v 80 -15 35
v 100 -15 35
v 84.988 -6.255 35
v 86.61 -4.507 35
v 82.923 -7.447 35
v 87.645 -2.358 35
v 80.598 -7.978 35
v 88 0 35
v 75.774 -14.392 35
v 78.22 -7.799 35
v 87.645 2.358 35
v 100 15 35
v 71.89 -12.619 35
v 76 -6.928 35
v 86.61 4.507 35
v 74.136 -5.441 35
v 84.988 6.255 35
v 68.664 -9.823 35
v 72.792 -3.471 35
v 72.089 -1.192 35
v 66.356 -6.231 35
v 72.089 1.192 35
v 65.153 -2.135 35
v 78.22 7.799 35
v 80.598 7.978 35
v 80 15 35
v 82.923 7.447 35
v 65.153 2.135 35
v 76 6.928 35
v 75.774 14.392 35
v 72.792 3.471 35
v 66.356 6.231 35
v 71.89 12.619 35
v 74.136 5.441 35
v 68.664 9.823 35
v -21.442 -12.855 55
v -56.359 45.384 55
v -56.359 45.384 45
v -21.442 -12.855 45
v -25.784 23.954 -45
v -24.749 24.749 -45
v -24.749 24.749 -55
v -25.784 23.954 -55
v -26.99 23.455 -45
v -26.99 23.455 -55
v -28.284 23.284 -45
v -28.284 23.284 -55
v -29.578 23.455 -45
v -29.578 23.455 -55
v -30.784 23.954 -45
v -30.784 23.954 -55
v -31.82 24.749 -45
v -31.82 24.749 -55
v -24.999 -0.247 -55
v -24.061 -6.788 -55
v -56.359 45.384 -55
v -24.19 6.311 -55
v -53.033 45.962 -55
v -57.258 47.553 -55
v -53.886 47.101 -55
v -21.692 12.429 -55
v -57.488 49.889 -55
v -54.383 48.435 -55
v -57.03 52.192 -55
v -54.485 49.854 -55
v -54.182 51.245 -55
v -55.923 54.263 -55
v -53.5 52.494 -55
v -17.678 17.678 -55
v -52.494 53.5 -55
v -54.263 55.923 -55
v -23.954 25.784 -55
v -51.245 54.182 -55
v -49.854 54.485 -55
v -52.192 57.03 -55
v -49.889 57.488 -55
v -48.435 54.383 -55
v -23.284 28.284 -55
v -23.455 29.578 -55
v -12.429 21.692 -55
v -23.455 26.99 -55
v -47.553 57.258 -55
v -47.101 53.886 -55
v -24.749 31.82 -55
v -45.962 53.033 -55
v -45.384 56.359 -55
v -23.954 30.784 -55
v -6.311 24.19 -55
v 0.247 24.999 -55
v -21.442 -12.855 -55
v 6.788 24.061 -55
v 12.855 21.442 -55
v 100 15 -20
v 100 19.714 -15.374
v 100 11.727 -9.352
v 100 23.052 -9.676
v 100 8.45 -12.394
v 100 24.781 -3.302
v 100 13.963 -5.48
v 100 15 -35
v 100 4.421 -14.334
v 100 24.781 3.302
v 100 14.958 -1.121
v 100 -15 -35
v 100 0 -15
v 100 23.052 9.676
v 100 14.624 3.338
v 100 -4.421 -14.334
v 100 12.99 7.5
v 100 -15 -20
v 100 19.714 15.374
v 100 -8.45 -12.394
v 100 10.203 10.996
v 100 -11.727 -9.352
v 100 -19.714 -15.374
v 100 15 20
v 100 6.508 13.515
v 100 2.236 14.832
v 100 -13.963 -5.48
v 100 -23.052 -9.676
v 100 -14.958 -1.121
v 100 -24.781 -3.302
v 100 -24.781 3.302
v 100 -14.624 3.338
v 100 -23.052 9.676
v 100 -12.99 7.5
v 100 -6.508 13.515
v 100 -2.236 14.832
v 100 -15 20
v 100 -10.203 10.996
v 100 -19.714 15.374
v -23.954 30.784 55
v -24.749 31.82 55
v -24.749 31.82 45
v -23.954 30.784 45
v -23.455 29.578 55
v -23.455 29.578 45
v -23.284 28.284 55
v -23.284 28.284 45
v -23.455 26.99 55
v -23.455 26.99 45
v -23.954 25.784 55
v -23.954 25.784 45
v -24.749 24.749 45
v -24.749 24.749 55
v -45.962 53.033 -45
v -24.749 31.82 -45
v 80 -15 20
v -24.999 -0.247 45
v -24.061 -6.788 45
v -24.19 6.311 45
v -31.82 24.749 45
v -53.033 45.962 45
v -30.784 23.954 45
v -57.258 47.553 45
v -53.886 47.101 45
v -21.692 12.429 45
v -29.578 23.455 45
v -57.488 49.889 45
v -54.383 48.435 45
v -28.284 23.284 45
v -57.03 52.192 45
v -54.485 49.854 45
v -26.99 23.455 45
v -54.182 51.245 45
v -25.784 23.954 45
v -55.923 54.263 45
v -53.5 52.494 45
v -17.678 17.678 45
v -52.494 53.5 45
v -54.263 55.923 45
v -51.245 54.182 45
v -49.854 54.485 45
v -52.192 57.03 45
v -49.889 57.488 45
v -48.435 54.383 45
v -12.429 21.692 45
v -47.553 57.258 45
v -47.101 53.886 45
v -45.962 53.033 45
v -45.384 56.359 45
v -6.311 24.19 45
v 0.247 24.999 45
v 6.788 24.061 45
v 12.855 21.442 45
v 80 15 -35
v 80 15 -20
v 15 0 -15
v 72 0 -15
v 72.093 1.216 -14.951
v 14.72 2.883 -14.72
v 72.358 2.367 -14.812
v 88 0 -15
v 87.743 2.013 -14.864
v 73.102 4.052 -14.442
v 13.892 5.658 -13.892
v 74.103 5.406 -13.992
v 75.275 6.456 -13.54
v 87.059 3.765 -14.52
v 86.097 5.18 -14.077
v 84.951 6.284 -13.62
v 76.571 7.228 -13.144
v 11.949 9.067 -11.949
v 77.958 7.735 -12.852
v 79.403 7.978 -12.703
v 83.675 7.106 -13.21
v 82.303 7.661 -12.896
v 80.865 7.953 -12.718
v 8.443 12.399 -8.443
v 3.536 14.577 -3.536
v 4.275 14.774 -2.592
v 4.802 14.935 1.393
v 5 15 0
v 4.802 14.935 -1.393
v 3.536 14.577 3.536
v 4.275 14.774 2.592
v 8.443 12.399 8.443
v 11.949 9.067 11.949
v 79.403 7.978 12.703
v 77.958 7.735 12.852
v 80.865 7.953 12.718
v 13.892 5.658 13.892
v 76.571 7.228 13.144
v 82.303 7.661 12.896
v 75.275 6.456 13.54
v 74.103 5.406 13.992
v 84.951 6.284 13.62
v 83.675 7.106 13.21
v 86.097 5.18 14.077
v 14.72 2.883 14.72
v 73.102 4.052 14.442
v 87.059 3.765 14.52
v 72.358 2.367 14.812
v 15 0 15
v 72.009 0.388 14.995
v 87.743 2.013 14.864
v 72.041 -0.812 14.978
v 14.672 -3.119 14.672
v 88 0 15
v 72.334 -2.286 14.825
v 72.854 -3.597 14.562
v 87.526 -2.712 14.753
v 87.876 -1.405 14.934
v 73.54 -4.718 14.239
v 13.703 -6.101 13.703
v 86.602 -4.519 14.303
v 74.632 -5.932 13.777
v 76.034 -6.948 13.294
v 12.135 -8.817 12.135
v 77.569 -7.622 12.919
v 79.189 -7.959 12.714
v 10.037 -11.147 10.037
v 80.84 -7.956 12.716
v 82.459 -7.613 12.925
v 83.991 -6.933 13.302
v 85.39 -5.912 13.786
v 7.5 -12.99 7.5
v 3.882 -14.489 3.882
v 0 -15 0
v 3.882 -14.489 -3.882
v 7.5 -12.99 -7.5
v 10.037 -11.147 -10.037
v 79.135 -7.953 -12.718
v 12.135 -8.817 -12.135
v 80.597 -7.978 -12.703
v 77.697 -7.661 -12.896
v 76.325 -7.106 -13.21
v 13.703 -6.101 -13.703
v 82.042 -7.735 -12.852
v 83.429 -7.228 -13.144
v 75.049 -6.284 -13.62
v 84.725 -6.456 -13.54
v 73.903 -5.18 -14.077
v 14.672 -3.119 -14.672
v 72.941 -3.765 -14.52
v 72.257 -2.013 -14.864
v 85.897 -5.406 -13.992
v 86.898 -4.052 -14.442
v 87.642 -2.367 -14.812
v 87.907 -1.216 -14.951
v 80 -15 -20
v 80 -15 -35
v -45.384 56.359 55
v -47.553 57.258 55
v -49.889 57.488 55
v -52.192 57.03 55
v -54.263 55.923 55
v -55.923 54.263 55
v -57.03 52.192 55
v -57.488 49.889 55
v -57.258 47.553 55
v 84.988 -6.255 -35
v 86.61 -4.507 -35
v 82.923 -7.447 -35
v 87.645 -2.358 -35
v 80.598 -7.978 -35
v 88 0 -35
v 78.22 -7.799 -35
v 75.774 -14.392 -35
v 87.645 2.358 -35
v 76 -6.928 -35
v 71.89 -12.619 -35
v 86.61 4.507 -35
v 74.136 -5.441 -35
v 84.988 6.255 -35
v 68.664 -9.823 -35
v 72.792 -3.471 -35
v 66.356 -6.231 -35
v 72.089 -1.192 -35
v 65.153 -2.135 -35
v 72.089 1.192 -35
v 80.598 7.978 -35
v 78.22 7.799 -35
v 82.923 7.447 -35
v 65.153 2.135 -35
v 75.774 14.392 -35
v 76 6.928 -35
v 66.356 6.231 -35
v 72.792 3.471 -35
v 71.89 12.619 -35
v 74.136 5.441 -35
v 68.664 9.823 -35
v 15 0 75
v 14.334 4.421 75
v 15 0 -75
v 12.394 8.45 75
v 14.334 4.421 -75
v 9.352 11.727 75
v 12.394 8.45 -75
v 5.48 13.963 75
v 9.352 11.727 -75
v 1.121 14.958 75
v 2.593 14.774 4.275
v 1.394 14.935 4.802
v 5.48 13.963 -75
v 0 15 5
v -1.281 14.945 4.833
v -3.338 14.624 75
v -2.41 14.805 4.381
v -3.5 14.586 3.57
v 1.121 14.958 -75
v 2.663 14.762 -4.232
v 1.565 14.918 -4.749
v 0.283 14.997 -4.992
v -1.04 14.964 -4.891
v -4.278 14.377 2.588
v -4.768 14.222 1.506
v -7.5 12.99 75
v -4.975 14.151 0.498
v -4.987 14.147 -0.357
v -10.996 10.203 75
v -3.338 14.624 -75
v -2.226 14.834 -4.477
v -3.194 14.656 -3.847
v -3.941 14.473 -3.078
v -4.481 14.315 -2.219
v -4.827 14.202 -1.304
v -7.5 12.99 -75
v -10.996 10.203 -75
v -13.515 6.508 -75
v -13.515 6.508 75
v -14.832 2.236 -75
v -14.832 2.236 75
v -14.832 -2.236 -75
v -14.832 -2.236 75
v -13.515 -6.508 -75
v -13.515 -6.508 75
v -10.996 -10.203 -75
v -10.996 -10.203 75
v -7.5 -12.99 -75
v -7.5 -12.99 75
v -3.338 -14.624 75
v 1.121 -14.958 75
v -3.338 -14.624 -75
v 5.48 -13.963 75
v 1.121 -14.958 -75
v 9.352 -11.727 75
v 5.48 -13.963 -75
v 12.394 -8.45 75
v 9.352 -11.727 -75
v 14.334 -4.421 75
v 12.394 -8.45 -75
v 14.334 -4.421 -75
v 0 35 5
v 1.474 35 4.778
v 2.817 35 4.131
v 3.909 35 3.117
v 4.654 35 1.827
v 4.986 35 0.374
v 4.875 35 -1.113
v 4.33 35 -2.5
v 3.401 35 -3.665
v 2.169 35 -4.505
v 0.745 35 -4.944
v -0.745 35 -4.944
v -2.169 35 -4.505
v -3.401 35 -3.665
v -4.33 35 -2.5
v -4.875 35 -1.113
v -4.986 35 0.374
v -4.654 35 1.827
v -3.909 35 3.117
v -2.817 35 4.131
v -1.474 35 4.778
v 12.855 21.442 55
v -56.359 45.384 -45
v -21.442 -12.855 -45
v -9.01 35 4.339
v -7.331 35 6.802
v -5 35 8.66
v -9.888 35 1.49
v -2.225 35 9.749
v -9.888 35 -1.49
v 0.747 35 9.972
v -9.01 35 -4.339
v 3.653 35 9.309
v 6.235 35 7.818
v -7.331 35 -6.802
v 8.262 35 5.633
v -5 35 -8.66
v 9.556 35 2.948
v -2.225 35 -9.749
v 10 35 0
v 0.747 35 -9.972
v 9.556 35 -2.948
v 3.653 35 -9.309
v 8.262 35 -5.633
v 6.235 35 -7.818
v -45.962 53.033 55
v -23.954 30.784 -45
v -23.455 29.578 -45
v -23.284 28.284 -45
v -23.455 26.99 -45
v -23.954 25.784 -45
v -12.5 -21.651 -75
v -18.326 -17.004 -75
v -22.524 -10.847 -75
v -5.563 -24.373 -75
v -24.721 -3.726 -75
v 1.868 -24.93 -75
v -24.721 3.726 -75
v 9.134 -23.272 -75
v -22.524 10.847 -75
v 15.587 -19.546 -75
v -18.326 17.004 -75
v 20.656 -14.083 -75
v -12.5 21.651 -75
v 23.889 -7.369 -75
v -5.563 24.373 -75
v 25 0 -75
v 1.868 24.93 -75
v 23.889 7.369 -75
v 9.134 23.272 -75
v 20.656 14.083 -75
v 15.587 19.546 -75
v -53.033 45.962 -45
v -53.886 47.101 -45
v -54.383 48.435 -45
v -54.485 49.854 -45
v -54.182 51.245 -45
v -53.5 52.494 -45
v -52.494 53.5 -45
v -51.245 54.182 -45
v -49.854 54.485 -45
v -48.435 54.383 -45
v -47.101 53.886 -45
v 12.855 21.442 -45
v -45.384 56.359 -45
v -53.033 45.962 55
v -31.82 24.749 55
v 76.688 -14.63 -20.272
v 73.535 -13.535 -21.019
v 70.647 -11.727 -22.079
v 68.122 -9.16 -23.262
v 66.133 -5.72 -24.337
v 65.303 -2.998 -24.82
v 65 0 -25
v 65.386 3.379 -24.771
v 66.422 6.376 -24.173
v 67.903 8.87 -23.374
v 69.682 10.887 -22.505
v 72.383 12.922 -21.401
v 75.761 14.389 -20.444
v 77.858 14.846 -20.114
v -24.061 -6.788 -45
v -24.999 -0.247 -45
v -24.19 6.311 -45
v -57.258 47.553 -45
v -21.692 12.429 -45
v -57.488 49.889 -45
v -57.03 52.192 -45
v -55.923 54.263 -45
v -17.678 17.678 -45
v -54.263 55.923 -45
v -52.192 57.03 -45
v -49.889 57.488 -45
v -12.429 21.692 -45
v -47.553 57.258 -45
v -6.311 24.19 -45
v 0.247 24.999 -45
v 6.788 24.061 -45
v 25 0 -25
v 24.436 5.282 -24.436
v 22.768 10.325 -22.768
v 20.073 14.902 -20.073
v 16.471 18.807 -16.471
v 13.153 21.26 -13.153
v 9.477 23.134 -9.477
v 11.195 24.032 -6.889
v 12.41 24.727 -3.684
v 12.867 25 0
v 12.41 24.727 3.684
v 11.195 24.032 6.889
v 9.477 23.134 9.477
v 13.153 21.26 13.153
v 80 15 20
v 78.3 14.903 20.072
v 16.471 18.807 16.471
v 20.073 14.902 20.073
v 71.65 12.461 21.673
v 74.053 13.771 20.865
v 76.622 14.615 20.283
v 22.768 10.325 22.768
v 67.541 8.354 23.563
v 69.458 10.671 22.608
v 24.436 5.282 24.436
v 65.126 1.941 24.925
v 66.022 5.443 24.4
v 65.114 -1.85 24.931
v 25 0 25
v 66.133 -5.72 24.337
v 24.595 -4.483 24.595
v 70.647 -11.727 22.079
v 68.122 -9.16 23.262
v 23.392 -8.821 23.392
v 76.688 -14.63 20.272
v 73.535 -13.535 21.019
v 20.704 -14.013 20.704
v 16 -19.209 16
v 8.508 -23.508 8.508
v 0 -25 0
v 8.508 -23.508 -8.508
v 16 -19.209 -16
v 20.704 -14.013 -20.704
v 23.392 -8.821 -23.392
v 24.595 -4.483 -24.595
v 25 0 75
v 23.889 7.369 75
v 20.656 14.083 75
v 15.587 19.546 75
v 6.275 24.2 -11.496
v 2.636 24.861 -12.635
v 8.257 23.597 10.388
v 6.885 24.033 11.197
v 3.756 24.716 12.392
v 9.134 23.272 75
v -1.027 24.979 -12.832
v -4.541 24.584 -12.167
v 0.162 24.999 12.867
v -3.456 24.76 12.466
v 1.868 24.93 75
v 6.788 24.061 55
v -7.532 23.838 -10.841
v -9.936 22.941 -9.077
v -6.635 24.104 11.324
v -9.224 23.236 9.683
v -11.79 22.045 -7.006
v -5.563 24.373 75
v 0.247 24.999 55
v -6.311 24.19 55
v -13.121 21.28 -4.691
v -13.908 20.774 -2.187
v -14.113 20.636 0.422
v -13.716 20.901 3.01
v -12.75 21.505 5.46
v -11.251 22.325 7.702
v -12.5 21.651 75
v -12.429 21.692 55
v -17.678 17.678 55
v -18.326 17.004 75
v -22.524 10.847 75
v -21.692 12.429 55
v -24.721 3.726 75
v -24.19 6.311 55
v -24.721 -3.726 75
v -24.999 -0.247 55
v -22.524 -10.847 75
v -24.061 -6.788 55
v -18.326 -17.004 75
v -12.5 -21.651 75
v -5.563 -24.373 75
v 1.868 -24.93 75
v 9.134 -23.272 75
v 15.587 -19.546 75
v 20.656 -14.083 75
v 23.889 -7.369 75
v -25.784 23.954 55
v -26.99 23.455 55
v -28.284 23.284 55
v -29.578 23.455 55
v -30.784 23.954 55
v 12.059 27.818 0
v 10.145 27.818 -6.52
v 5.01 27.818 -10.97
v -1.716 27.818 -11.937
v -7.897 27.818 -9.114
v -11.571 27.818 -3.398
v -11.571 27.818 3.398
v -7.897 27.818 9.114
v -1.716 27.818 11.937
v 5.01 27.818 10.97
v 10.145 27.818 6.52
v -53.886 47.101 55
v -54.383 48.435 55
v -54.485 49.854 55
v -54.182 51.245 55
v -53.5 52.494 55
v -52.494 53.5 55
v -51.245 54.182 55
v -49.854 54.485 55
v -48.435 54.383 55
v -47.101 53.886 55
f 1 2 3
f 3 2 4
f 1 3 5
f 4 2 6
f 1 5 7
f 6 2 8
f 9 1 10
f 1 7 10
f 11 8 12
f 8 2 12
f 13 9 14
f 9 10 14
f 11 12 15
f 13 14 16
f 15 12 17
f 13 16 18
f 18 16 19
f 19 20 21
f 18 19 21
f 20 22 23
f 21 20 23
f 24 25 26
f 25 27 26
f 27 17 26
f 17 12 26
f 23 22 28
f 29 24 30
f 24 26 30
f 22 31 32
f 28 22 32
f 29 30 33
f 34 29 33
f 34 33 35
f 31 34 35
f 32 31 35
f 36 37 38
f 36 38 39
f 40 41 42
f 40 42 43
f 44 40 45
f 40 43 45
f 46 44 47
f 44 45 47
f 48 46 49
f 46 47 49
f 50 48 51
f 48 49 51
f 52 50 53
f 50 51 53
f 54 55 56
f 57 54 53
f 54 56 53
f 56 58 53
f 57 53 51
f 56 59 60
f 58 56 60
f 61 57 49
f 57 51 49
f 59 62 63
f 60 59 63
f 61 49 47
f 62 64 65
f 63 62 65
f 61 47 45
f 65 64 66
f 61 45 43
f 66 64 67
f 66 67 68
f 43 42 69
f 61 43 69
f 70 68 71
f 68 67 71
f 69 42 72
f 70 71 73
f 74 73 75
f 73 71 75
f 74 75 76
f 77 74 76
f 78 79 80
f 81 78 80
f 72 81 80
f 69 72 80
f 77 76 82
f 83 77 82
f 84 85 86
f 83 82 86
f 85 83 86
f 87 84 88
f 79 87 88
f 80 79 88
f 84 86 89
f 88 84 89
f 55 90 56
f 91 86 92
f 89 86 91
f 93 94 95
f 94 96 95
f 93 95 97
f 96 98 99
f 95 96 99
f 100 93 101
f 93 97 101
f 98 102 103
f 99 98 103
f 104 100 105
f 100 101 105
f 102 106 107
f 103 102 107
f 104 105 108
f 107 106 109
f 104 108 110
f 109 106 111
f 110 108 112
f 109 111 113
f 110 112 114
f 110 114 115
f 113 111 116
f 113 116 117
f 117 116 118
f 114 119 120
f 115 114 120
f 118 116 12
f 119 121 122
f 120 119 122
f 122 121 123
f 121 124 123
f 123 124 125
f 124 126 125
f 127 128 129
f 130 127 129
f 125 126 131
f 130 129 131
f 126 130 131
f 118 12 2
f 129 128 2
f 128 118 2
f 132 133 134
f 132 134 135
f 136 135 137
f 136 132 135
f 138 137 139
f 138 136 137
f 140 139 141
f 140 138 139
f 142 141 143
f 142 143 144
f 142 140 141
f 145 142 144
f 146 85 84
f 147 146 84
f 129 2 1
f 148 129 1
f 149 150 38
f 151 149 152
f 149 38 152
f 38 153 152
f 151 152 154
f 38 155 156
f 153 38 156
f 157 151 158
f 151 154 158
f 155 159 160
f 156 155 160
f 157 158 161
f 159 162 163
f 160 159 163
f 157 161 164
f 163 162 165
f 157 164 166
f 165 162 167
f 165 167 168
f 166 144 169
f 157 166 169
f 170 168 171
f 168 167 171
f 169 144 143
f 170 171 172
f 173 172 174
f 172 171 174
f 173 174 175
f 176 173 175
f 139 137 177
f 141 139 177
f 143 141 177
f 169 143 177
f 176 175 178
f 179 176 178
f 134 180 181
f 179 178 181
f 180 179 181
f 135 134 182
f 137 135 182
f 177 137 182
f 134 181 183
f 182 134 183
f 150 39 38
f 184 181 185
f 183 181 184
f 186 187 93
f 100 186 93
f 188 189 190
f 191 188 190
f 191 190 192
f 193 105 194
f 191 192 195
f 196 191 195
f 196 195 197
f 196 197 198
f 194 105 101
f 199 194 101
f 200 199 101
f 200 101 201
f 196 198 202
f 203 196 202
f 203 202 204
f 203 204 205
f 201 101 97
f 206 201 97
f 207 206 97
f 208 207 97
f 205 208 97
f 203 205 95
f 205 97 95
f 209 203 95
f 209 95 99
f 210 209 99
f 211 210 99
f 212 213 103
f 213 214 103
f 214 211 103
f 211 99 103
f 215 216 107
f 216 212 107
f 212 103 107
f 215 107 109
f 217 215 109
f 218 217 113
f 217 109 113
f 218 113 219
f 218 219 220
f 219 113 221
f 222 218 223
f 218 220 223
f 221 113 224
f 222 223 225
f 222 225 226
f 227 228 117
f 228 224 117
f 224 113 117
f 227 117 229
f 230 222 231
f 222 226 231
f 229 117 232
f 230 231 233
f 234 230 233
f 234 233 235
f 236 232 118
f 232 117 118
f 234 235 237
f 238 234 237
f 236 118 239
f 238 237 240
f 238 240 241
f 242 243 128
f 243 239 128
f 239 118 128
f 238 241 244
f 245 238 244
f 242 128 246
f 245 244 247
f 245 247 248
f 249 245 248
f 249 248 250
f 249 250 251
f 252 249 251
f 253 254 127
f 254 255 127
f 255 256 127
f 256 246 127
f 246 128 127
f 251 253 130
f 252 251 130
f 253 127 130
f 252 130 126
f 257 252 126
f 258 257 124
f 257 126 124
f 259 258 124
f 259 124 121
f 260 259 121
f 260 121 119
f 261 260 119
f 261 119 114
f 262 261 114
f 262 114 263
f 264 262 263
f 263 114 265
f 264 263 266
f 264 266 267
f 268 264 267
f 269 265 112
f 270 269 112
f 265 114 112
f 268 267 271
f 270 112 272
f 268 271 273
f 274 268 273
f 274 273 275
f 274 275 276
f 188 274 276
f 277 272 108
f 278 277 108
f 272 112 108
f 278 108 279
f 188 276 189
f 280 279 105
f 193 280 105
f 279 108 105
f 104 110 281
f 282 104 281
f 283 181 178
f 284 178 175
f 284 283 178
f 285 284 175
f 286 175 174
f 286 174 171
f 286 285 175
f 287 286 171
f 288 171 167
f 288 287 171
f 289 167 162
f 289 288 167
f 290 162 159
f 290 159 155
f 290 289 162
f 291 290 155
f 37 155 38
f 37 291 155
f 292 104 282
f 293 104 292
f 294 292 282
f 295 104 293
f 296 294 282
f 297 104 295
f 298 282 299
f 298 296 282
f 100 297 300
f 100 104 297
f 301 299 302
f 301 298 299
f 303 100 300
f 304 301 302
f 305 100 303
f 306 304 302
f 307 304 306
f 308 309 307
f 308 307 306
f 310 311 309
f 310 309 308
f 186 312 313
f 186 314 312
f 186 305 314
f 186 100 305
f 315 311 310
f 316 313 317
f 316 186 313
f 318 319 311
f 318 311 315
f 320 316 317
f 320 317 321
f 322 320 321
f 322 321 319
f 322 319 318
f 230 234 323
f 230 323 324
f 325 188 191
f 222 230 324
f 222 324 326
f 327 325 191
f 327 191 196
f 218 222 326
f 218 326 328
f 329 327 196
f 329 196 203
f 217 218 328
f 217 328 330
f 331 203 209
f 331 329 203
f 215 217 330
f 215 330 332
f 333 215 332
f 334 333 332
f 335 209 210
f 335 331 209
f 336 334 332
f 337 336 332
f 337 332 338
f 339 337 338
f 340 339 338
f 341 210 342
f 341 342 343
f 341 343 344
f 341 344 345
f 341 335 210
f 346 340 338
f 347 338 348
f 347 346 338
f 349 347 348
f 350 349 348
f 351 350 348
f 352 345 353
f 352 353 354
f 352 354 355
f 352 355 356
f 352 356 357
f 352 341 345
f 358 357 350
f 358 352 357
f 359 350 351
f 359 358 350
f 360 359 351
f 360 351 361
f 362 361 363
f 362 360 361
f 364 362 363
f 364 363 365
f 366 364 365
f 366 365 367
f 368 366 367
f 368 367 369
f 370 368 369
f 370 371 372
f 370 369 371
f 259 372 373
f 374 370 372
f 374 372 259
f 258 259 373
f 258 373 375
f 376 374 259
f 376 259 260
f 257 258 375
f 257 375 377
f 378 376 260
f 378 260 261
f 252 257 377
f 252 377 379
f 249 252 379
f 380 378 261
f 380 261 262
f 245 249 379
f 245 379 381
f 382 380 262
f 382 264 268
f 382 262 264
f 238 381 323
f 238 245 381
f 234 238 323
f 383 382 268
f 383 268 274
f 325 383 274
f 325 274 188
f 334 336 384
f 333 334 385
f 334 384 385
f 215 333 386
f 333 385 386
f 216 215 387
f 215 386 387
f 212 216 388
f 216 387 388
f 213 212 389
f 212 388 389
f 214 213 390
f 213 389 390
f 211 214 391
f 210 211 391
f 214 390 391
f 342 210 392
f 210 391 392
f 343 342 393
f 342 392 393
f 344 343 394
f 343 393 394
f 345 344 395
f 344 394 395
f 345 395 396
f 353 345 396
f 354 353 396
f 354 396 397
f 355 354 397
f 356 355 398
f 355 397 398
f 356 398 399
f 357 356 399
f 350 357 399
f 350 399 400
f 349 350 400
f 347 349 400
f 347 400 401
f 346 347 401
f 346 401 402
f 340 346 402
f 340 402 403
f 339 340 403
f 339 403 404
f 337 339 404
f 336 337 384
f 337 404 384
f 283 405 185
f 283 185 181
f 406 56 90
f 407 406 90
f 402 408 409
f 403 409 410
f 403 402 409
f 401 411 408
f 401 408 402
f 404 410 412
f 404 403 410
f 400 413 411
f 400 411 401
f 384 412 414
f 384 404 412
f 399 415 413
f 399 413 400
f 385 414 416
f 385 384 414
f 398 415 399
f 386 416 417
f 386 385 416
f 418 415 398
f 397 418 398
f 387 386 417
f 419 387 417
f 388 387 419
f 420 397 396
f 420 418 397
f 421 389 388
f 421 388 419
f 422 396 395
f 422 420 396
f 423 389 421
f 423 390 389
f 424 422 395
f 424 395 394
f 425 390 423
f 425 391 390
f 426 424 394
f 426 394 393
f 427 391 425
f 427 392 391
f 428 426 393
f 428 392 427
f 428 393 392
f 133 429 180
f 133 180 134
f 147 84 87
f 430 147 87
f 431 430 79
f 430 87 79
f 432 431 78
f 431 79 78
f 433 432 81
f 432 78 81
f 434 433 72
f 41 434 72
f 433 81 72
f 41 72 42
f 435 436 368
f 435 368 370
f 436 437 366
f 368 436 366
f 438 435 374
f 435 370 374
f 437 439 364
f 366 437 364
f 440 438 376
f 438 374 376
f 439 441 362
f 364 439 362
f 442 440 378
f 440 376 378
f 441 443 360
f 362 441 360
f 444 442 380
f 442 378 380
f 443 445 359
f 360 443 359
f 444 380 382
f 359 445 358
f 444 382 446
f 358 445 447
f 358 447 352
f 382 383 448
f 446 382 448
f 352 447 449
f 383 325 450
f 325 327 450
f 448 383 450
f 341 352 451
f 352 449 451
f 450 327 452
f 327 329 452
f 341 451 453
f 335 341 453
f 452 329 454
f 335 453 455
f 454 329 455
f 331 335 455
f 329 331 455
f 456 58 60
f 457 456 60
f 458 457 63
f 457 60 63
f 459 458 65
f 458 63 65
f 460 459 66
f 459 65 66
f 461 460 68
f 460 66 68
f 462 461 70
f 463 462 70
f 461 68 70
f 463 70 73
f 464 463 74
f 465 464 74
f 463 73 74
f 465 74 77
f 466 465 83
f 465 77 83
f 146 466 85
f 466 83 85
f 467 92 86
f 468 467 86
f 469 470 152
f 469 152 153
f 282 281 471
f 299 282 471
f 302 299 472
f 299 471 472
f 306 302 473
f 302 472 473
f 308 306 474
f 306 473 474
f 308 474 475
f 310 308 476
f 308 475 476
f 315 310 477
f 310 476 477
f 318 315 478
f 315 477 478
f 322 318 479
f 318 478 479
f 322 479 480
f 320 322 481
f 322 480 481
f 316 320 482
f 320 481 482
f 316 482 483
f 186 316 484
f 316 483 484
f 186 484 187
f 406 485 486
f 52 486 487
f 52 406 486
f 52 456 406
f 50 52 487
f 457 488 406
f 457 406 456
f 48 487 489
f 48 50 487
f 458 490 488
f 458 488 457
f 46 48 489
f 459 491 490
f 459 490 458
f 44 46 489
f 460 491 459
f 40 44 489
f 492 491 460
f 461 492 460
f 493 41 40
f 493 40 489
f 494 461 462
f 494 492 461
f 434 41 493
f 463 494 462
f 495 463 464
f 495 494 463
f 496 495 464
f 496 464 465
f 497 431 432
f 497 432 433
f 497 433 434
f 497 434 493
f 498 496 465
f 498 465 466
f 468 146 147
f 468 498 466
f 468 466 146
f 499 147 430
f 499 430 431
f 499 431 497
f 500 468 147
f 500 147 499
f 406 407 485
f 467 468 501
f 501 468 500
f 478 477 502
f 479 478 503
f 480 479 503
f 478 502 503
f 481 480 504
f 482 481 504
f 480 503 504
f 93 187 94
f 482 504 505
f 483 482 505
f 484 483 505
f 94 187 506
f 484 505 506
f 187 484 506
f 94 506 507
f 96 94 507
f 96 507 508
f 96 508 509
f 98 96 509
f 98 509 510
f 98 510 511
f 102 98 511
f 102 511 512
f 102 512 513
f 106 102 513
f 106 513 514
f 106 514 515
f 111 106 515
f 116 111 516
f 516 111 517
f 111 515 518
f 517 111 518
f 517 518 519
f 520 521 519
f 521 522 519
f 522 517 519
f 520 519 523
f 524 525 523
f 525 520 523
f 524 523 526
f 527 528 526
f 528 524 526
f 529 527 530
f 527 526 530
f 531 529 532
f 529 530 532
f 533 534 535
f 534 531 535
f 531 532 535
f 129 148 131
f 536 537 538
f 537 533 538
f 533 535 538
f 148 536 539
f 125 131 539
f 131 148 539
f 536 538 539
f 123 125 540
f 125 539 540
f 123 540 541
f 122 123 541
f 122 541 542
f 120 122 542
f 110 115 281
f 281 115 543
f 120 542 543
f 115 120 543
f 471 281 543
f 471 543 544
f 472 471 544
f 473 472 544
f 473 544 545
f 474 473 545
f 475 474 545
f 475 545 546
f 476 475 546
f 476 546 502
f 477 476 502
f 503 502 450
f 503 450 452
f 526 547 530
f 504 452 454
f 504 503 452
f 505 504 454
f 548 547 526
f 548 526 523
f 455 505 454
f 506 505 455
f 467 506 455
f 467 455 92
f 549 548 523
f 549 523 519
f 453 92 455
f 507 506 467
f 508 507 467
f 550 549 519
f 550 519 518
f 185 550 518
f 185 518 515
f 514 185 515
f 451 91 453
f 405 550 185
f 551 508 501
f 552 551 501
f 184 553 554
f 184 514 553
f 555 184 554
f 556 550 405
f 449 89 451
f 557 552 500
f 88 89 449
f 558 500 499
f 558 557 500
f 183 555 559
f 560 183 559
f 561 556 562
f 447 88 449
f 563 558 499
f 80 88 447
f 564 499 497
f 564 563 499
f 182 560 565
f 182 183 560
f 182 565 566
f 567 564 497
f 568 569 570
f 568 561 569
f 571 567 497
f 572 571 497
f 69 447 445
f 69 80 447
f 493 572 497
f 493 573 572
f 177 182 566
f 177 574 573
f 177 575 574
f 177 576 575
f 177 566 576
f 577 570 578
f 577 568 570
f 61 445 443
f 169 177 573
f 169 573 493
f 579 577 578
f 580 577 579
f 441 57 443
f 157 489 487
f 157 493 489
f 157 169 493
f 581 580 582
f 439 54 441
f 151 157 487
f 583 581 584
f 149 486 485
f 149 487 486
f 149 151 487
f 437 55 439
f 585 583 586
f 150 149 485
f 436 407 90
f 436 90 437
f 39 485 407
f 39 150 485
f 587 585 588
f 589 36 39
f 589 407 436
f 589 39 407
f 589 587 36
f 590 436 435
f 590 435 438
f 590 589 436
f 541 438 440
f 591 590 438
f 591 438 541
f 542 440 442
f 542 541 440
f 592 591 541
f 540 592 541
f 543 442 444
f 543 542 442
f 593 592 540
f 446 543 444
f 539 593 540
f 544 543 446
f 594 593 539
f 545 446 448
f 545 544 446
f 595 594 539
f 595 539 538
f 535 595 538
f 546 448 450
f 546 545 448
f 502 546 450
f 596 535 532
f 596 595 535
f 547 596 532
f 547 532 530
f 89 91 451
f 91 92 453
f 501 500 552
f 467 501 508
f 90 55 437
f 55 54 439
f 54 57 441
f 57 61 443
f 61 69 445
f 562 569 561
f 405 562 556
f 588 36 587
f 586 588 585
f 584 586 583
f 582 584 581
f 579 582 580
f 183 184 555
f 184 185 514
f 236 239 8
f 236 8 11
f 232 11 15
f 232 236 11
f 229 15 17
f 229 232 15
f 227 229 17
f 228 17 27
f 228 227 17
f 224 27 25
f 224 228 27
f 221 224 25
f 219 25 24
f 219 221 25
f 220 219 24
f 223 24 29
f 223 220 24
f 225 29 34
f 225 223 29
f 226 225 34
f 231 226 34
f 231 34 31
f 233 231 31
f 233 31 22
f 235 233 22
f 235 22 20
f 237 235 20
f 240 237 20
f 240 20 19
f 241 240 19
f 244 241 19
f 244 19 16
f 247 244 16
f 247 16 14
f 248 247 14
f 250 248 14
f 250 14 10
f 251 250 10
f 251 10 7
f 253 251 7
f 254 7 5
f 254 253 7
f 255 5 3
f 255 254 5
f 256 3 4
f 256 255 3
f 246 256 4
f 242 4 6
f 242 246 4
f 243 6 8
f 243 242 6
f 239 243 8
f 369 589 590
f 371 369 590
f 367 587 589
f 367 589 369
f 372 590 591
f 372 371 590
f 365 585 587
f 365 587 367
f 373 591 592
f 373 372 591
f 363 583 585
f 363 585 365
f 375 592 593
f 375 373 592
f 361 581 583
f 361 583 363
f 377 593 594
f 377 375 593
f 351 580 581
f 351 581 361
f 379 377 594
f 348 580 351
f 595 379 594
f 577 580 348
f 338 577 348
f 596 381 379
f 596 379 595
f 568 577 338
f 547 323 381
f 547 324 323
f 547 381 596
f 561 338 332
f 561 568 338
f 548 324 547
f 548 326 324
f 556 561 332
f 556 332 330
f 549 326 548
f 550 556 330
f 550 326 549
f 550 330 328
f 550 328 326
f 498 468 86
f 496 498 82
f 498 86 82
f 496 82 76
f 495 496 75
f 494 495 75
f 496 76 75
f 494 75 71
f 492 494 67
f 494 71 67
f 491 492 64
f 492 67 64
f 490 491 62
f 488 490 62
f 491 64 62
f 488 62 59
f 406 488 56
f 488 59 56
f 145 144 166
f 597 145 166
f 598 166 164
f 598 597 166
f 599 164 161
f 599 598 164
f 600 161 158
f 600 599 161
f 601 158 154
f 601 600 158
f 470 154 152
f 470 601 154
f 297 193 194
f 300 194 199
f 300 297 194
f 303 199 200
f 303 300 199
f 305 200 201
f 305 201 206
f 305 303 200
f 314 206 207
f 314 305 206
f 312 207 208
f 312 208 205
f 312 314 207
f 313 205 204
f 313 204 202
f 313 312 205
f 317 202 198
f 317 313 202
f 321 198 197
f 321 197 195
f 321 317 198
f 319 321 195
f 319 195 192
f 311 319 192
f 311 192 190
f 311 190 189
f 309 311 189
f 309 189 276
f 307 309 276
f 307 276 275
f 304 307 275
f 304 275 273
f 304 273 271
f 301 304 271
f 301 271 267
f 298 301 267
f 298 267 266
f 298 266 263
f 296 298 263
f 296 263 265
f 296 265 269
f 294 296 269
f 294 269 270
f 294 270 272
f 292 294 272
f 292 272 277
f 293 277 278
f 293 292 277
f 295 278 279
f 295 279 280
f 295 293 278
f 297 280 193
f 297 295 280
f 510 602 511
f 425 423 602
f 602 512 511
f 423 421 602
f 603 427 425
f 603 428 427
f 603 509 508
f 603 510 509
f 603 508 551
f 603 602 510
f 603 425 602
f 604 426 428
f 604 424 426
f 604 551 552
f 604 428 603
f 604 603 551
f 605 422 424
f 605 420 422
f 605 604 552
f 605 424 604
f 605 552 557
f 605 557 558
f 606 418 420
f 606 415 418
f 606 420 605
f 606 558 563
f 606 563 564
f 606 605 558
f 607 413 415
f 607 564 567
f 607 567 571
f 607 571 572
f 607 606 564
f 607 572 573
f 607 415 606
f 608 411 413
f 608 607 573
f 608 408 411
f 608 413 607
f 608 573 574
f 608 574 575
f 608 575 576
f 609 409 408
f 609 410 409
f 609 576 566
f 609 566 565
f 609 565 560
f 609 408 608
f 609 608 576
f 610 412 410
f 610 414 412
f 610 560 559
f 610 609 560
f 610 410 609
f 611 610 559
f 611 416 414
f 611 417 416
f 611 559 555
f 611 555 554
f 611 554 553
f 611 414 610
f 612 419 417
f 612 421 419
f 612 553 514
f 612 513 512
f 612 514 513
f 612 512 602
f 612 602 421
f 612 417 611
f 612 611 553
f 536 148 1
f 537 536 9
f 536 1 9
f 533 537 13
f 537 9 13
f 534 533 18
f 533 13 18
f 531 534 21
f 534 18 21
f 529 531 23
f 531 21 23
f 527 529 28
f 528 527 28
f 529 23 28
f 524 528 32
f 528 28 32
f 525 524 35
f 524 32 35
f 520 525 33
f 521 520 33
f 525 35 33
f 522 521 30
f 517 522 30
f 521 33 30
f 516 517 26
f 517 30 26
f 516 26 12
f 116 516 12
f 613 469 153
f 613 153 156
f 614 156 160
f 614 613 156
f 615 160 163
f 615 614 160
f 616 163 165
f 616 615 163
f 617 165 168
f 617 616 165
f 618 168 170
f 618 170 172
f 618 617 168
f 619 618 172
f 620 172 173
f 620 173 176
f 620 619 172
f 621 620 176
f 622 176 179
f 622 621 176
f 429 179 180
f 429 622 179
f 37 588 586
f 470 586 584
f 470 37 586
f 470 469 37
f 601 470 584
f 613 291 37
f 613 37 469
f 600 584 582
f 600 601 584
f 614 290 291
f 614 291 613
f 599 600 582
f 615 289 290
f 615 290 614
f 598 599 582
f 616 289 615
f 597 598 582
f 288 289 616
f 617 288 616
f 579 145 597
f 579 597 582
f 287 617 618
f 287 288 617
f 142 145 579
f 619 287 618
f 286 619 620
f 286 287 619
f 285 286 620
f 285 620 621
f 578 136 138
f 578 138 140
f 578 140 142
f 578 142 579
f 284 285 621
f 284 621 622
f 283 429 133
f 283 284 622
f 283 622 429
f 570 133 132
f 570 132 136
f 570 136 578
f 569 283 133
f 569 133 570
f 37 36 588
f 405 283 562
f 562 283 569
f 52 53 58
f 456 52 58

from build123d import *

# Parameters (mm, degrees)
SKETCH1_R               = 25
BOSS_EXTRUDE1_DEPTH     = 75
BOSS_EXTRUDE2_START     = 35
SKETCH3_R               = 10
BOSS_EXTRUDE2_DEPTH     = 35
BOSS_EXTRUDE2_DRAFT     = 16
SKETCH4_R               = 25
BOSS_EXTRUDE3_DEPTH     = 100
BOSS_EXTRUDE4_DEPTH     = 35
BOSS_EXTRUDE5_START     = 10
BOSS_EXTRUDE5_DEPTH     = 10
CUT_EXTRUDE2_DEPTH      = 190.22462748
CUT_EXTRUDE2_DEPTH_BACK = 190.22462748
SKETCH2_R               = 15
SKETCH7_R               = 15
CUT_EXTRUDE3_DEPTH      = 100
CUT_EXTRUDE4_DEPTH      = 160.392470452
CUT_EXTRUDE4_DEPTH_BACK = 160.392470452
SKETCH8_R               = 8
SKETCH9_R               = 5
CUT_EXTRUDE5_DEPTH      = 30


with BuildPart() as part:
    # Sketch1 → Boss-Extrude1 (new, symmetric)
    with BuildSketch(Plane.XY):
        Circle(SKETCH1_R)
    extrude(amount=BOSS_EXTRUDE1_DEPTH, both=True)


with BuildPart() as boss_extrude2_tool:
    # Sketch3 → Boss-Extrude2 (with draft: the straight prism first)
    with BuildSketch(Plane(origin=(0, 0, 0), x_dir=(1, 0, 0), z_dir=(0, 1, 0)).offset(BOSS_EXTRUDE2_START)):
        Circle(SKETCH3_R)
    extrude(amount=-BOSS_EXTRUDE2_DEPTH)
    # Boss-Extrude2: the draft: its side faces are tilted about the plane it starts from
    boss_extrude2_sides = [boss_extrude2_tool.faces().sort_by_distance(p)[0] for p in [
        (-10, 17.5, 0),
    ]]
    draft(boss_extrude2_sides, Plane(origin=(0, 0, 0), x_dir=(1, 0, 0), z_dir=(0, 1, 0)).offset(BOSS_EXTRUDE2_START), BOSS_EXTRUDE2_DRAFT)


with BuildPart() as part_1:
    add(part.part)

    # Boss-Extrude2: add boss_extrude2_tool
    add(boss_extrude2_tool.part)

    # Sketch4 → Boss-Extrude3 (add)
    with BuildSketch(Plane(origin=(0, 0, 0), x_dir=(0, 0, -1), z_dir=(1, 0, 0))):
        Circle(SKETCH4_R)
    extrude(amount=BOSS_EXTRUDE3_DEPTH)

    # Sketch5 → Boss-Extrude4 (add, symmetric)
    with BuildSketch(Plane.XY):
        with BuildLine():
            Line((80, 15), (100, 15))
            Line((100, 15), (100, -15))
            Line((100, -15), (80, -15))
            ThreePointArc((80, -15), (65, 0), (80, 15))
        make_face()
    extrude(amount=BOSS_EXTRUDE4_DEPTH, both=True)

    # Sketch6 → Boss-Extrude5 (add)
    with BuildSketch(Plane.XY.offset(45).offset(BOSS_EXTRUDE5_START)):
        with BuildLine():
            ThreePointArc((-45.383782434, 56.358781853), (-55.154328933, 55.154328933), (-56.358781853, 45.383782434))
            Line((-56.358781853, 45.383782434), (-21.441584906, -12.855288278))
            ThreePointArc((-21.441584906, -12.855288278), (-24.812182391, 3.058693344), (-17.67766953, 17.67766953))
            ThreePointArc((-17.67766953, 17.67766953), (-3.058693344, 24.812182391), (12.855288278, 21.441584906))
            Line((12.855288278, 21.441584906), (-45.383782434, 56.358781853))
        make_face()
        with BuildLine():
            ThreePointArc((-24.748737342, 31.819805153), (-23.284271247, 28.284271247), (-24.748737342, 24.748737342))
            ThreePointArc((-24.748737342, 24.748737342), (-28.284271247, 23.284271247), (-31.819805153, 24.748737342))
            Line((-31.819805153, 24.748737342), (-53.033008589, 45.961940777))
            ThreePointArc((-53.033008589, 45.961940777), (-53.033008589, 53.033008589), (-45.961940777, 53.033008589))
            Line((-45.961940777, 53.033008589), (-24.748737342, 31.819805153))
        make_face(mode=Mode.SUBTRACT)
    boss_extrude5 = extrude(amount=-BOSS_EXTRUDE5_DEPTH)

    # Mirror1: Boss-Extrude5 across plane
    add(boss_extrude5.mirror(Plane.XY))

    # Sketch2 → Cut-Extrude2 (cut, two sides: drawn at the far end of the back side and taken through both)
    with BuildSketch(Plane.XY.offset(75).offset(-CUT_EXTRUDE2_DEPTH_BACK)):
        Circle(SKETCH2_R)
    extrude(amount=CUT_EXTRUDE2_DEPTH + CUT_EXTRUDE2_DEPTH_BACK, mode=Mode.SUBTRACT)

    # Sketch7 → Cut-Extrude3 (cut)
    with BuildSketch(Plane(origin=(100, 0, 0), x_dir=(0, 0, -1), z_dir=(1, 0, 0))):
        Circle(SKETCH7_R)
    extrude(amount=-CUT_EXTRUDE3_DEPTH, mode=Mode.SUBTRACT)

    # Sketch8 → Cut-Extrude4 (cut, two sides: drawn at the far end of the back side and taken through both)
    with BuildSketch(Plane.XY.offset(35).offset(-CUT_EXTRUDE4_DEPTH_BACK)):
        with Locations((80, 0)):
            Circle(SKETCH8_R)
    extrude(amount=CUT_EXTRUDE4_DEPTH + CUT_EXTRUDE4_DEPTH_BACK, mode=Mode.SUBTRACT)

    # Sketch9 → Cut-Extrude5 (cut)
    with BuildSketch(Plane(origin=(0, 35, 0), x_dir=(1, 0, 0), z_dir=(0, 1, 0))):
        with Locations(Location((0, 0, 0), (0, 0, 270))):
            Circle(SKETCH9_R)
    extrude(amount=-CUT_EXTRUDE5_DEPTH, mode=Mode.SUBTRACT)


solid = part_1.part
